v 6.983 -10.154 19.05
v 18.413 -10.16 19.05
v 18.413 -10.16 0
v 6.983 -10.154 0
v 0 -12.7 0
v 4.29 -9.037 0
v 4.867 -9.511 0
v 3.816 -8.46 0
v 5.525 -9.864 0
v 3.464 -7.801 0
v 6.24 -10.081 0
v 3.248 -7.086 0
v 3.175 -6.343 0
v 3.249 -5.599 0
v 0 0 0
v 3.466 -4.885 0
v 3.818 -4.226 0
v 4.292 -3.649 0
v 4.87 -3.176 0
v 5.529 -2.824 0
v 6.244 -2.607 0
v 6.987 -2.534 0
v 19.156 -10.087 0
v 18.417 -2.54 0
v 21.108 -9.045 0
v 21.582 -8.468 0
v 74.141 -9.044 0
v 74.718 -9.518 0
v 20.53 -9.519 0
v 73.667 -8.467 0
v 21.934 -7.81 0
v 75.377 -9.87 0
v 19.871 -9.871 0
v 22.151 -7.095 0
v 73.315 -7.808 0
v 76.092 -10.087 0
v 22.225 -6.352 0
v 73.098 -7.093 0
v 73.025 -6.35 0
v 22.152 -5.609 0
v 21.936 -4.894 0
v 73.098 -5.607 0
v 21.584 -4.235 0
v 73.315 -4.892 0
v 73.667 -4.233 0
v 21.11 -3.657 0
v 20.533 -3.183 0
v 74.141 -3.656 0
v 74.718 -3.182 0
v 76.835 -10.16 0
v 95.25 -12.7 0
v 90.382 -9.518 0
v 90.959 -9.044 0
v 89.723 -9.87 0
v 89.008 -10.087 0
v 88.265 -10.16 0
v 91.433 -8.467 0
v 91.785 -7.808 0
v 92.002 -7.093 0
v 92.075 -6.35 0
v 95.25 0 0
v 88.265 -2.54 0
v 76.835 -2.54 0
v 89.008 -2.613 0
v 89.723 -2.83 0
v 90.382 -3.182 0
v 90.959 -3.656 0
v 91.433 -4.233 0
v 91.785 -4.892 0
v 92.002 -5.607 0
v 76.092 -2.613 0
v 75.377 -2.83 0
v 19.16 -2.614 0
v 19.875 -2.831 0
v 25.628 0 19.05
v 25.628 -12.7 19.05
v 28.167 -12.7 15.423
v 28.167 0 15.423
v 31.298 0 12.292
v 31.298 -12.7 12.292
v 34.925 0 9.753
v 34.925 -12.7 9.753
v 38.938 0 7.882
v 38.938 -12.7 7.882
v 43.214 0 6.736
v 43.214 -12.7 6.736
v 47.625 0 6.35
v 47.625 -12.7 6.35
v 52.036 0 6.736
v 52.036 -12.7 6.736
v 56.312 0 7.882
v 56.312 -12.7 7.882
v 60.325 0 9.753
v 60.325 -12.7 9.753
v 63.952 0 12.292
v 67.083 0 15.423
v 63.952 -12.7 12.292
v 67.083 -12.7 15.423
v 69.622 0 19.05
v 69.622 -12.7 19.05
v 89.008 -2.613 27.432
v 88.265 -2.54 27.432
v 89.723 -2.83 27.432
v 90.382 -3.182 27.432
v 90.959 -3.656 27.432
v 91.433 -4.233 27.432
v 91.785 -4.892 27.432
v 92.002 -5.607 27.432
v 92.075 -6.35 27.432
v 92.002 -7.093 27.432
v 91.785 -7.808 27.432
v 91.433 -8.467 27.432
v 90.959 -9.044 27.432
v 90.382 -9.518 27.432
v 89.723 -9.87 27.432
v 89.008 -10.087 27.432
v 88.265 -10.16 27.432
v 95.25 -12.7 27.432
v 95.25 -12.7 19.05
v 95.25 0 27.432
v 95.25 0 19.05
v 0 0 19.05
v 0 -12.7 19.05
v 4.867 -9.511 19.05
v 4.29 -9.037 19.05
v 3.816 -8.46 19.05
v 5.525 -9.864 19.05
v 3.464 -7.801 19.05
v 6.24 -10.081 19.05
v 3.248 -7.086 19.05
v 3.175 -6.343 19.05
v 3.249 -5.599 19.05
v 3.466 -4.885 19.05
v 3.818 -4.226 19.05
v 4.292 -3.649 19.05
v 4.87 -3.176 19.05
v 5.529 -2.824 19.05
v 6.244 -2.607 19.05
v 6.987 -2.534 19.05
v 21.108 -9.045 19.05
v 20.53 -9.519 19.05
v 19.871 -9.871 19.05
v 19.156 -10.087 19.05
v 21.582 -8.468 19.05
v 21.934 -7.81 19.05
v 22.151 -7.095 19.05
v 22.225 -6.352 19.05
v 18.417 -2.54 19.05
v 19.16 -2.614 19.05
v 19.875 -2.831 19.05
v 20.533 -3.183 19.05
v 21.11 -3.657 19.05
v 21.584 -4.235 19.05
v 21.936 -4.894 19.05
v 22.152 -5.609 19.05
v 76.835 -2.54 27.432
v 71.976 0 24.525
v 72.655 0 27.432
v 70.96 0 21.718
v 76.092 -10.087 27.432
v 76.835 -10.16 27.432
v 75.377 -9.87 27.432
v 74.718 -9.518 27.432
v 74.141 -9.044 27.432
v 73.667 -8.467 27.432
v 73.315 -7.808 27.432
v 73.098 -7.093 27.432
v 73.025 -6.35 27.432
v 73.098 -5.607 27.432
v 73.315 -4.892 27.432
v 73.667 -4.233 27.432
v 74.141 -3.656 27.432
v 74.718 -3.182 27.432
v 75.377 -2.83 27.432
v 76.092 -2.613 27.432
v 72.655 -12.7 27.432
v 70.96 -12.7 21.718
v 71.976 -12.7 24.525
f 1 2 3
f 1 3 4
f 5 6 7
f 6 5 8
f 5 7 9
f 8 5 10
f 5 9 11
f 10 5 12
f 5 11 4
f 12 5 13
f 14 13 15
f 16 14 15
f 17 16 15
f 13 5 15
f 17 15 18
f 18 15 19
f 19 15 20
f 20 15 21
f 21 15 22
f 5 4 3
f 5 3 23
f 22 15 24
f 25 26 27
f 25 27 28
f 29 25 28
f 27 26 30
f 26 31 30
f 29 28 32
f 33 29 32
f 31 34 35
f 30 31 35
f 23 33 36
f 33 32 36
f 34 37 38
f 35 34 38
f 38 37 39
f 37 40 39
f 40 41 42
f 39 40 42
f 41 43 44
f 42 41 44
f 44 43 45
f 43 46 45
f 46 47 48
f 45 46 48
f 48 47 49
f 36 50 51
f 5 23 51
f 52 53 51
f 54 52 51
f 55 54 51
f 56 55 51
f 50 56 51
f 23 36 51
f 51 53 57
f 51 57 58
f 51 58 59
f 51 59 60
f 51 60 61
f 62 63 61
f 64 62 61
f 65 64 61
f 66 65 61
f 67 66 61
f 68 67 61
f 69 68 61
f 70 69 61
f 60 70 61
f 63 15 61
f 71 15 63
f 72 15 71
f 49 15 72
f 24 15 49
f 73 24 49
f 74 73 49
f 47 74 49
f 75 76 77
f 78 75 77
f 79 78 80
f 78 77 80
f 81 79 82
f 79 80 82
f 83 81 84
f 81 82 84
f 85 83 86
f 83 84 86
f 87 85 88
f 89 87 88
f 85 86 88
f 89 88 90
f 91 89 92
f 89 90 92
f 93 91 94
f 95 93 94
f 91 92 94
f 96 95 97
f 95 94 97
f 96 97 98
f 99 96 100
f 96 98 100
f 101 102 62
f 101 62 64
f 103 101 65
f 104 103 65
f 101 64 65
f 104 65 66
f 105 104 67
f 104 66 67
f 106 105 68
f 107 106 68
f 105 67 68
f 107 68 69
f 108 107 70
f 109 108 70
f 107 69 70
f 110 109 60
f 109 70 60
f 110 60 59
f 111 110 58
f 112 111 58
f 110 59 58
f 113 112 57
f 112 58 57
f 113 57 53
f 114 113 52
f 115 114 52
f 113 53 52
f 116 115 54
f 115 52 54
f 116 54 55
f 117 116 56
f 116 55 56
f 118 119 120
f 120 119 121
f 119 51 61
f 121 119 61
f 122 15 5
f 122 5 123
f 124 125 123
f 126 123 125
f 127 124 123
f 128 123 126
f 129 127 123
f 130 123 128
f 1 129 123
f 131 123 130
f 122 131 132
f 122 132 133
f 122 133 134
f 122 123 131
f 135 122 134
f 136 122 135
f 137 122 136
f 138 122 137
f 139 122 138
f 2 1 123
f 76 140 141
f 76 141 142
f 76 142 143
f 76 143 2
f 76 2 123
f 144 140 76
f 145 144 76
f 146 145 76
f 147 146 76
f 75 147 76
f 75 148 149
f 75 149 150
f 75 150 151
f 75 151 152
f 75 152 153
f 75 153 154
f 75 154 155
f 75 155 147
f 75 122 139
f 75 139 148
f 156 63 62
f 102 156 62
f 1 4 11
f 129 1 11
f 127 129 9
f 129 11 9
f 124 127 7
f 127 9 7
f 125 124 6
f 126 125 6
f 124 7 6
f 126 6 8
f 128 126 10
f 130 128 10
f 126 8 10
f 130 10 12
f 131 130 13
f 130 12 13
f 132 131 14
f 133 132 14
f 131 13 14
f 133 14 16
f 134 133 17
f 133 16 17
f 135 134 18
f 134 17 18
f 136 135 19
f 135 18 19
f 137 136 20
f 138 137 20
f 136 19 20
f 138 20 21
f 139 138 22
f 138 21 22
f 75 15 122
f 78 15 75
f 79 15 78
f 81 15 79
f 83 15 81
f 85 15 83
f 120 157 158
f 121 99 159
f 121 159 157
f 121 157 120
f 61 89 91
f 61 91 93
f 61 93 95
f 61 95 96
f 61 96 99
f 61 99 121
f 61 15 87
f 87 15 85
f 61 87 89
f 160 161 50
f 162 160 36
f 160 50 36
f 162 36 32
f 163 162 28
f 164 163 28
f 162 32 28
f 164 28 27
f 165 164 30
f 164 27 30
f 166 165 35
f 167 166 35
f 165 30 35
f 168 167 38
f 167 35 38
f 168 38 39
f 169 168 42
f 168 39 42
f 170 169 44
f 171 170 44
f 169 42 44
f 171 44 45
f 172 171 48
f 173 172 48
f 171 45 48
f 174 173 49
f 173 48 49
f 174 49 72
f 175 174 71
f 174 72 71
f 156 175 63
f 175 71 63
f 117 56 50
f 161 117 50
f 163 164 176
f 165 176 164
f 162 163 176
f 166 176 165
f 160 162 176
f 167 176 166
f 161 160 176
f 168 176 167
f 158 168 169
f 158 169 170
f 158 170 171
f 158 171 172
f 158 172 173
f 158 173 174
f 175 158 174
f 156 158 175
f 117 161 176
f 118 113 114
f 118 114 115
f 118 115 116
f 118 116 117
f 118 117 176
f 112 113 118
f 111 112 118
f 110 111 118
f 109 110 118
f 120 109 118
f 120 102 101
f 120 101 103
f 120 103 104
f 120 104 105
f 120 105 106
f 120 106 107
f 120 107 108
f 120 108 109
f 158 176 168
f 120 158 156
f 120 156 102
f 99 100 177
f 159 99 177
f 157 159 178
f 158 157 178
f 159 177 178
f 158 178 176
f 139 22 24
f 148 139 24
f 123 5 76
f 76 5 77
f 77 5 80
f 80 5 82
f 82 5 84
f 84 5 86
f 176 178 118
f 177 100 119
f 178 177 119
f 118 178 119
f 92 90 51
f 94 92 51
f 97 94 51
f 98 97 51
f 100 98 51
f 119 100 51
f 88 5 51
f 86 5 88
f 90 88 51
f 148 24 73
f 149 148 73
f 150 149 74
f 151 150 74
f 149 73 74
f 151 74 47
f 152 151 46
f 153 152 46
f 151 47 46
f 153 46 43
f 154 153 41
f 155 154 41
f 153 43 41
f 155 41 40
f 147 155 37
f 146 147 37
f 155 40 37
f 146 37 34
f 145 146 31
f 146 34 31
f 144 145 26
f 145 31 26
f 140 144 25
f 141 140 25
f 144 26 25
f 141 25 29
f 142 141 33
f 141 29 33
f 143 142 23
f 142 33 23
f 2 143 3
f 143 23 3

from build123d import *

# Parameters (mm, degrees)
F0_W     = 95.25
F0_H     = 19.05
F1_DEPTH = 12.7
F3_DEPTH = 19.051
F4_W     = 25.6279547439
F4_H     = 12.7
F5_DEPTH = 8.382
F7_DEPTH = 12.701


with BuildPart() as f1:
    # F0 (on Front) → F1 (new body)
    with BuildSketch(Plane.XZ):
        with Locations((47.625, 9.525)):
            Rectangle(F0_W, F0_H)
    extrude(amount=F1_DEPTH)

    # F2 (on face) → F3 (cut, through all)
    with BuildSketch(Plane(origin=(0, 0, 0), x_dir=(1, 0, 0), z_dir=(0, 0, -1))):
        with BuildLine():
            Line((18.4131473885, 10.1599995496), (6.9831433348, 10.1544417125))
            ThreePointArc((6.9831433348, 10.1544417125), (3.1749963967, 6.3425895514), (6.9868485577, 2.5344426133))
            Line((6.9868485577, 2.5344426133), (18.4168526115, 2.5400004504))
            ThreePointArc((18.4168526115, 2.5400004504), (22.2249995496, 6.3518526115), (18.4131473885, 10.1599995496))
        make_face()
        with BuildLine():
            Line((76.835, 2.54), (88.265, 2.54))
            ThreePointArc((88.265, 2.54), (92.075, 6.35), (88.265, 10.16))
            Line((88.265, 10.16), (76.835, 10.16))
            ThreePointArc((76.835, 10.16), (73.025, 6.35), (76.835, 2.54))
        make_face()
    extrude(amount=-F3_DEPTH, mode=Mode.SUBTRACT)

    # F4 (on face) → F5 (join)
    with BuildSketch(Plane.XY.offset(19.05)):
        with Locations((82.4360226281, -6.35)):
            Rectangle(F4_W, F4_H)
        with BuildLine():
            ThreePointArc((76.835, -10.16), (73.025, -6.35), (76.835, -2.54))
            Line((76.835, -2.54), (88.265, -2.54))
            ThreePointArc((88.265, -2.54), (92.075, -6.35), (88.265, -10.16))
            Line((88.265, -10.16), (76.835, -10.16))
        make_face(mode=Mode.SUBTRACT)
    extrude(amount=F5_DEPTH)

    # F6 (on face) → F7 (cut, through all)
    with BuildSketch(Plane.XZ.offset(12.7)):
        with BuildLine():
            ThreePointArc((25.6279547439, 19.05), (47.625, 6.35), (69.6220452561, 19.05))
            Line((69.6220452561, 19.05), (25.6279547439, 19.05))
        make_face()
        with BuildLine():
            Line((69.6220452561, 27.432), (69.6220452561, 19.05))
            ThreePointArc((69.6220452561, 19.05), (71.5092373122, 23.1068982411), (72.6552791834, 27.432))
            Line((72.6552791834, 27.432), (69.6220452561, 27.432))
        make_face()
    extrude(amount=-F7_DEPTH, mode=Mode.SUBTRACT)


solid = f1.part
